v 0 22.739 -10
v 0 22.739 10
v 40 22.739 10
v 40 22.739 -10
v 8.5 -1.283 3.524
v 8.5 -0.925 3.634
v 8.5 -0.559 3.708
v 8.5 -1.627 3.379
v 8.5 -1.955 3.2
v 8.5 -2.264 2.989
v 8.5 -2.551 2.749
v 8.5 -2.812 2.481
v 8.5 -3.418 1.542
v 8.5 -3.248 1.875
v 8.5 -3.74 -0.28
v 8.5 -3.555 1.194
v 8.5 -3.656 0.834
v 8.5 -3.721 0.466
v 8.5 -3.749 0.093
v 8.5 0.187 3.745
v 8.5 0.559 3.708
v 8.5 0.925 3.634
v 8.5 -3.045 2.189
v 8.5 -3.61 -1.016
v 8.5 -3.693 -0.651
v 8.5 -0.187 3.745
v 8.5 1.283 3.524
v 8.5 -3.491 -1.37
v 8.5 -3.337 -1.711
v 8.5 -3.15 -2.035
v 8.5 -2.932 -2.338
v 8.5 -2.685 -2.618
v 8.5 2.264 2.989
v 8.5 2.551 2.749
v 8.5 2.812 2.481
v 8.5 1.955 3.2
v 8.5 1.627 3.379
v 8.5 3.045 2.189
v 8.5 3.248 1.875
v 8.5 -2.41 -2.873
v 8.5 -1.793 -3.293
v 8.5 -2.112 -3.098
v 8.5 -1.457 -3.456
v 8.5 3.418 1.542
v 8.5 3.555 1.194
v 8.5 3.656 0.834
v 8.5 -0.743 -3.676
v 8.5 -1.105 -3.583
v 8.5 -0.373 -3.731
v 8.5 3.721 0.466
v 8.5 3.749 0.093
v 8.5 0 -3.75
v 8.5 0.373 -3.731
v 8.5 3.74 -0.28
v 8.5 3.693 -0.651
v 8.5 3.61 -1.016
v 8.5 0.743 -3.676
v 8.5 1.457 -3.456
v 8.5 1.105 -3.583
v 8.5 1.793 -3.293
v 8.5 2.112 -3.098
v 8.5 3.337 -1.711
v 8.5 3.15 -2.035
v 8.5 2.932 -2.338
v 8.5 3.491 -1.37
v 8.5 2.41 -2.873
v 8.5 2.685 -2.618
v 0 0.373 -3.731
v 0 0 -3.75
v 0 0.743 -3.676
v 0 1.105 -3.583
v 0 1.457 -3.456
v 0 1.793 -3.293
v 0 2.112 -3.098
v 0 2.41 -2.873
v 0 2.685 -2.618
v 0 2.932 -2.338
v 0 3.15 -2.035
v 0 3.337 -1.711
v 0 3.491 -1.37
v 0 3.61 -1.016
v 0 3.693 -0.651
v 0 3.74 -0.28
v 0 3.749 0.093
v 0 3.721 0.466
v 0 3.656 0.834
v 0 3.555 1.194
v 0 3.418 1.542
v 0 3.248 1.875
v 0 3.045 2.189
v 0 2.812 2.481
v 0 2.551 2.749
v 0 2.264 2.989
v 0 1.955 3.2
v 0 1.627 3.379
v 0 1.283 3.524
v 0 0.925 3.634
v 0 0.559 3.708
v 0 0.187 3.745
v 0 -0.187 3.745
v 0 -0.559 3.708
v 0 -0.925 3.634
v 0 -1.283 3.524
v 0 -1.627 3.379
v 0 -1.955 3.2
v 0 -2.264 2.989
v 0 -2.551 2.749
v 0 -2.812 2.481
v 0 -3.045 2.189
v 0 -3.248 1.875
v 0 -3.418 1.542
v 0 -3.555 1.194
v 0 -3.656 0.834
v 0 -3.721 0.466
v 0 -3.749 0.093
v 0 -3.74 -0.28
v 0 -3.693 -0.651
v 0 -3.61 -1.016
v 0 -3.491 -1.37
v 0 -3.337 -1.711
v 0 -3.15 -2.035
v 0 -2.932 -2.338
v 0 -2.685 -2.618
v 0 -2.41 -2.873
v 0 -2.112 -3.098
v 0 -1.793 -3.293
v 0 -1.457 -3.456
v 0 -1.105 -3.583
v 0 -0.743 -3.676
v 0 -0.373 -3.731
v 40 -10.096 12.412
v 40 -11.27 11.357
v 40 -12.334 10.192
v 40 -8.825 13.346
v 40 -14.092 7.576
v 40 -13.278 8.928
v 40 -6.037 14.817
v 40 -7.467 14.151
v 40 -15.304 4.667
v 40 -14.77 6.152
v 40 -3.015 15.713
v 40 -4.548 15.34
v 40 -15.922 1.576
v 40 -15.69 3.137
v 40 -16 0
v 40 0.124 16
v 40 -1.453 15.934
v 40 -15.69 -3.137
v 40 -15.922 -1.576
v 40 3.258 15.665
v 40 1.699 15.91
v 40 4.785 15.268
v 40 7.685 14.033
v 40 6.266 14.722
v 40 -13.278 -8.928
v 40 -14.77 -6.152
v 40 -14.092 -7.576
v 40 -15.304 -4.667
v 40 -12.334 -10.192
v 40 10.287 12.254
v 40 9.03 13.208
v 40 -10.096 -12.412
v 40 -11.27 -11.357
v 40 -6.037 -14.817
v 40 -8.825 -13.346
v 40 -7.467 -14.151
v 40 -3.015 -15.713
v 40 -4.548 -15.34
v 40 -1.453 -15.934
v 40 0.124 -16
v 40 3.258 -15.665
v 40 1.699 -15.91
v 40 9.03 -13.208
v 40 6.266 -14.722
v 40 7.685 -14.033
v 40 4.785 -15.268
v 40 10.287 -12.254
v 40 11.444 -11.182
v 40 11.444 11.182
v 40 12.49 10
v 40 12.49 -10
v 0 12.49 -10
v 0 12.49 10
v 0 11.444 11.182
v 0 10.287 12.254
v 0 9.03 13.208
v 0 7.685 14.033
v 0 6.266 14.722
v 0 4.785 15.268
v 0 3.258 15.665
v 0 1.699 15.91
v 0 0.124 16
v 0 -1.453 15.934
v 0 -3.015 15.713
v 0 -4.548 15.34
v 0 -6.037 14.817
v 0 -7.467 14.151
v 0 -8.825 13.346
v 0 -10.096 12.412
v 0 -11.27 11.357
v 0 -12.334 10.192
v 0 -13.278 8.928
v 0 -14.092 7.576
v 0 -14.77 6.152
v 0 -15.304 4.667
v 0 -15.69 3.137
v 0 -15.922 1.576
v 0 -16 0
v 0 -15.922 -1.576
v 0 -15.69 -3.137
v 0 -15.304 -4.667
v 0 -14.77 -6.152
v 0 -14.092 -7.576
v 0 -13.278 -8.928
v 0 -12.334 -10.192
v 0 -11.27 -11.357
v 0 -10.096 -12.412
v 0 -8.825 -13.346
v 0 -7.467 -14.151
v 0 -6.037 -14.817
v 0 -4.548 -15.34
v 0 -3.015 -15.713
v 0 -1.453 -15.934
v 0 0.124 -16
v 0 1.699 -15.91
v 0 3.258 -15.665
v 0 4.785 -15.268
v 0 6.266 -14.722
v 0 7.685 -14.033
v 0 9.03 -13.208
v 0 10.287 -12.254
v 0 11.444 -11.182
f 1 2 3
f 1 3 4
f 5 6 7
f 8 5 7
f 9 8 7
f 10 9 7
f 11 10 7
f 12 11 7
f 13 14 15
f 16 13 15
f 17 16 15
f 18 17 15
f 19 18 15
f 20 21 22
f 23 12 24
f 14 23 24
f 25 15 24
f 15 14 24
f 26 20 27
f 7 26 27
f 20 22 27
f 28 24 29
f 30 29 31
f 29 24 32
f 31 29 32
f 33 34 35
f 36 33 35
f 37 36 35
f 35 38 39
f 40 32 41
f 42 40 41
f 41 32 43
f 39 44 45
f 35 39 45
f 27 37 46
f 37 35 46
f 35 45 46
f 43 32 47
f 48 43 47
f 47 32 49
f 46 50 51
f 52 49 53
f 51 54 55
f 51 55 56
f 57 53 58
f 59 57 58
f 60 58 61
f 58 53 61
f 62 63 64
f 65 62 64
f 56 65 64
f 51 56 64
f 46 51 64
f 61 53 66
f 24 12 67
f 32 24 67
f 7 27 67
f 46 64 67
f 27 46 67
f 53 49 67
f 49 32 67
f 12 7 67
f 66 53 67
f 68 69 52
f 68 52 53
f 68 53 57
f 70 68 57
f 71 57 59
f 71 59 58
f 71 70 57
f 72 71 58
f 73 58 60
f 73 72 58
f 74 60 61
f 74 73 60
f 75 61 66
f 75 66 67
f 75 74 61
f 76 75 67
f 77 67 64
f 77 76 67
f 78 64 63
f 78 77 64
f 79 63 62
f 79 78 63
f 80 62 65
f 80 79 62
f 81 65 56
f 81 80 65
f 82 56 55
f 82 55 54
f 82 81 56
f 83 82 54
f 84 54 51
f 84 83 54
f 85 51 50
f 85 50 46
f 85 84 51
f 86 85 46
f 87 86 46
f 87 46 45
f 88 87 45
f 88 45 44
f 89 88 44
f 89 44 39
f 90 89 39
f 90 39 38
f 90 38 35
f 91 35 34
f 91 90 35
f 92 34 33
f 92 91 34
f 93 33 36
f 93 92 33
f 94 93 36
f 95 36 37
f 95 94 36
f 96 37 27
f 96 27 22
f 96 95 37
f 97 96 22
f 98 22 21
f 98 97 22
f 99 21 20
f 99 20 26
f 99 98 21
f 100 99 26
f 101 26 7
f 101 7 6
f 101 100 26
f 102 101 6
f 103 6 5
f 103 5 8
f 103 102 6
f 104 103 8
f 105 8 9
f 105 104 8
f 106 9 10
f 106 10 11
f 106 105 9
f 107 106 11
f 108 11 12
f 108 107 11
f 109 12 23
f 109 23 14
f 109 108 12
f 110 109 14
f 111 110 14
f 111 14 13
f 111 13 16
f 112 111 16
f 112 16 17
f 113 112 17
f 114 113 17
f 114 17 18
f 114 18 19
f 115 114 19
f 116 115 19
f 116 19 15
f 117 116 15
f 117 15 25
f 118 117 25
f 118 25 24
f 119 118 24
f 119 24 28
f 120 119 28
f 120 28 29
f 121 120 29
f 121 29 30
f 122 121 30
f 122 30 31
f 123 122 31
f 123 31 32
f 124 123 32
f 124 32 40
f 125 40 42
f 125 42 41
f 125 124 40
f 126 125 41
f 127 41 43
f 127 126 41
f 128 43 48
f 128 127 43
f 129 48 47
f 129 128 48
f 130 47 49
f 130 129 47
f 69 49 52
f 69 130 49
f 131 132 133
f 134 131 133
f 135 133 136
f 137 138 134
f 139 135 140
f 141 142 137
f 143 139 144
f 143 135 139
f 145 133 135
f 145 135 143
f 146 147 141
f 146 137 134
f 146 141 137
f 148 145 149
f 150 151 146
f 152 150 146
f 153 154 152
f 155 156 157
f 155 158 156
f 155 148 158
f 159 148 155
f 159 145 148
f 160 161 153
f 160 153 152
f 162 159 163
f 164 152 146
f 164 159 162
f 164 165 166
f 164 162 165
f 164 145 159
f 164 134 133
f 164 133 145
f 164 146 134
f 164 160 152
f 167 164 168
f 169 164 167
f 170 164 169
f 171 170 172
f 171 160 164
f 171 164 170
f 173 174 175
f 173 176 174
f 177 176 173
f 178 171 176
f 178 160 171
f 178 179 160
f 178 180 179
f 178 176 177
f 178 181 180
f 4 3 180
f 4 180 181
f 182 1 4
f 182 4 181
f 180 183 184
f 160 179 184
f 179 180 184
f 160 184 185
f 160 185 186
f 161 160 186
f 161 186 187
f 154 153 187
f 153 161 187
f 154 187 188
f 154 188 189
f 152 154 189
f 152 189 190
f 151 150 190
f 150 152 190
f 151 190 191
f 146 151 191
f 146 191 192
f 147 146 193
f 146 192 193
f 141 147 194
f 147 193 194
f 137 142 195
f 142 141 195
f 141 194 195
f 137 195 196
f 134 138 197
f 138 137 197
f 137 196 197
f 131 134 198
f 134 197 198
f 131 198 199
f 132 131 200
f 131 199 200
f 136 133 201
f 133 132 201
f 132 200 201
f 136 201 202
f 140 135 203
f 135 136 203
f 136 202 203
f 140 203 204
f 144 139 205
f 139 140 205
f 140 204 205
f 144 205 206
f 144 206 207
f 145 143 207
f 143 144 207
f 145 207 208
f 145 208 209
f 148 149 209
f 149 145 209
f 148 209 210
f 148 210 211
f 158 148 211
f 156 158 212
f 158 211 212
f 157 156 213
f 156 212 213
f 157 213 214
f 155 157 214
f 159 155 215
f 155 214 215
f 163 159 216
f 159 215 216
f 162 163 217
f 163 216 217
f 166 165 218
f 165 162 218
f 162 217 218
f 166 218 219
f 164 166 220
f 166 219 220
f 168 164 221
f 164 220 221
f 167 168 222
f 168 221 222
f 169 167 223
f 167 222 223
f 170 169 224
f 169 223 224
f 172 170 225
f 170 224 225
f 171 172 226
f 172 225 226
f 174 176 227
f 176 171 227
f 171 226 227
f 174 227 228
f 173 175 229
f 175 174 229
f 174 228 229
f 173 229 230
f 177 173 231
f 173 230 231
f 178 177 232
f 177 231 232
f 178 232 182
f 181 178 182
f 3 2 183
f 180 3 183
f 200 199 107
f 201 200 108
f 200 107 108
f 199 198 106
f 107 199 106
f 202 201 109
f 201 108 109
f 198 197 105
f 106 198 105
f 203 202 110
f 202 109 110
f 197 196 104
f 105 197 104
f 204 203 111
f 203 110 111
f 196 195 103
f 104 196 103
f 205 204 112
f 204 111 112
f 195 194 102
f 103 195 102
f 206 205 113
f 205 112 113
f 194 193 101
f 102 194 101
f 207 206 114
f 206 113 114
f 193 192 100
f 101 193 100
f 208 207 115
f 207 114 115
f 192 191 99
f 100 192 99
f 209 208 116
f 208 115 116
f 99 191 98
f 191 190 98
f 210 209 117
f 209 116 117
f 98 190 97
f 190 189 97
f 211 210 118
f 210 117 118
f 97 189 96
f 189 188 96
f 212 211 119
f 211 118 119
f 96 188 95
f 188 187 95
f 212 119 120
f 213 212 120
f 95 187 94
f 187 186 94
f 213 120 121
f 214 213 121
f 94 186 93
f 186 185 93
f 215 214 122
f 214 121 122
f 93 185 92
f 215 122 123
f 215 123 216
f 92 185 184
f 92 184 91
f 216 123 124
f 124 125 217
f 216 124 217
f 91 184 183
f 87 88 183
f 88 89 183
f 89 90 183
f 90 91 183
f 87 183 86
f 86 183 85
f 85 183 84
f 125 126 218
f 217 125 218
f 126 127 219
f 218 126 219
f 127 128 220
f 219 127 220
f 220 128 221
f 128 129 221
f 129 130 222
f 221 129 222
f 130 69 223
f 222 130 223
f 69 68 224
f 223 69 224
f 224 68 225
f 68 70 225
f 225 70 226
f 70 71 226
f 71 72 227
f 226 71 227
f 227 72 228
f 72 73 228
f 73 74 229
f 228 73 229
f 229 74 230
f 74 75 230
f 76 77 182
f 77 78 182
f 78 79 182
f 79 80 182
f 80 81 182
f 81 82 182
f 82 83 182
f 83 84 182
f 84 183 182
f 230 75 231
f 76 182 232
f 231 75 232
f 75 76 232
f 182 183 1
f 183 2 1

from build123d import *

# Parameters (mm, degrees)
SKETCH2_R           = 16
BOSS_EXTRUDE1_DEPTH = 40
SKETCH3_R           = 3.75
CUT_EXTRUDE1_DEPTH  = 8.5
BOSS_EXTRUDE3_DEPTH = 40


with BuildPart() as part:
    # Sketch2 → Boss-Extrude1 (new body)
    with BuildSketch(Plane(origin=(0, 0, 0), x_dir=(0, 0, -1), z_dir=(1, 0, 0))):
        Circle(SKETCH2_R)
    extrude(amount=BOSS_EXTRUDE1_DEPTH)

    # Sketch3 → Cut-Extrude1 (cut)
    with BuildSketch(Plane(origin=(0, 0, 0), x_dir=(0, 0, -1), z_dir=(1, 0, 0))):
        Circle(SKETCH3_R)
    extrude(amount=CUT_EXTRUDE1_DEPTH, mode=Mode.SUBTRACT)

    # Sketch4 → Boss-Extrude3 (add, through all)
    with BuildSketch(Plane(origin=(0, 0, 0), x_dir=(0, 0, -1), z_dir=(1, 0, 0))):
        Polygon((10, 12.489995997), (-10, 12.489995997), (-10, 15.822191594), (-10, 22.739406358), (10, 22.739406358), align=None)
    extrude(amount=BOSS_EXTRUDE3_DEPTH)


solid = part.part
